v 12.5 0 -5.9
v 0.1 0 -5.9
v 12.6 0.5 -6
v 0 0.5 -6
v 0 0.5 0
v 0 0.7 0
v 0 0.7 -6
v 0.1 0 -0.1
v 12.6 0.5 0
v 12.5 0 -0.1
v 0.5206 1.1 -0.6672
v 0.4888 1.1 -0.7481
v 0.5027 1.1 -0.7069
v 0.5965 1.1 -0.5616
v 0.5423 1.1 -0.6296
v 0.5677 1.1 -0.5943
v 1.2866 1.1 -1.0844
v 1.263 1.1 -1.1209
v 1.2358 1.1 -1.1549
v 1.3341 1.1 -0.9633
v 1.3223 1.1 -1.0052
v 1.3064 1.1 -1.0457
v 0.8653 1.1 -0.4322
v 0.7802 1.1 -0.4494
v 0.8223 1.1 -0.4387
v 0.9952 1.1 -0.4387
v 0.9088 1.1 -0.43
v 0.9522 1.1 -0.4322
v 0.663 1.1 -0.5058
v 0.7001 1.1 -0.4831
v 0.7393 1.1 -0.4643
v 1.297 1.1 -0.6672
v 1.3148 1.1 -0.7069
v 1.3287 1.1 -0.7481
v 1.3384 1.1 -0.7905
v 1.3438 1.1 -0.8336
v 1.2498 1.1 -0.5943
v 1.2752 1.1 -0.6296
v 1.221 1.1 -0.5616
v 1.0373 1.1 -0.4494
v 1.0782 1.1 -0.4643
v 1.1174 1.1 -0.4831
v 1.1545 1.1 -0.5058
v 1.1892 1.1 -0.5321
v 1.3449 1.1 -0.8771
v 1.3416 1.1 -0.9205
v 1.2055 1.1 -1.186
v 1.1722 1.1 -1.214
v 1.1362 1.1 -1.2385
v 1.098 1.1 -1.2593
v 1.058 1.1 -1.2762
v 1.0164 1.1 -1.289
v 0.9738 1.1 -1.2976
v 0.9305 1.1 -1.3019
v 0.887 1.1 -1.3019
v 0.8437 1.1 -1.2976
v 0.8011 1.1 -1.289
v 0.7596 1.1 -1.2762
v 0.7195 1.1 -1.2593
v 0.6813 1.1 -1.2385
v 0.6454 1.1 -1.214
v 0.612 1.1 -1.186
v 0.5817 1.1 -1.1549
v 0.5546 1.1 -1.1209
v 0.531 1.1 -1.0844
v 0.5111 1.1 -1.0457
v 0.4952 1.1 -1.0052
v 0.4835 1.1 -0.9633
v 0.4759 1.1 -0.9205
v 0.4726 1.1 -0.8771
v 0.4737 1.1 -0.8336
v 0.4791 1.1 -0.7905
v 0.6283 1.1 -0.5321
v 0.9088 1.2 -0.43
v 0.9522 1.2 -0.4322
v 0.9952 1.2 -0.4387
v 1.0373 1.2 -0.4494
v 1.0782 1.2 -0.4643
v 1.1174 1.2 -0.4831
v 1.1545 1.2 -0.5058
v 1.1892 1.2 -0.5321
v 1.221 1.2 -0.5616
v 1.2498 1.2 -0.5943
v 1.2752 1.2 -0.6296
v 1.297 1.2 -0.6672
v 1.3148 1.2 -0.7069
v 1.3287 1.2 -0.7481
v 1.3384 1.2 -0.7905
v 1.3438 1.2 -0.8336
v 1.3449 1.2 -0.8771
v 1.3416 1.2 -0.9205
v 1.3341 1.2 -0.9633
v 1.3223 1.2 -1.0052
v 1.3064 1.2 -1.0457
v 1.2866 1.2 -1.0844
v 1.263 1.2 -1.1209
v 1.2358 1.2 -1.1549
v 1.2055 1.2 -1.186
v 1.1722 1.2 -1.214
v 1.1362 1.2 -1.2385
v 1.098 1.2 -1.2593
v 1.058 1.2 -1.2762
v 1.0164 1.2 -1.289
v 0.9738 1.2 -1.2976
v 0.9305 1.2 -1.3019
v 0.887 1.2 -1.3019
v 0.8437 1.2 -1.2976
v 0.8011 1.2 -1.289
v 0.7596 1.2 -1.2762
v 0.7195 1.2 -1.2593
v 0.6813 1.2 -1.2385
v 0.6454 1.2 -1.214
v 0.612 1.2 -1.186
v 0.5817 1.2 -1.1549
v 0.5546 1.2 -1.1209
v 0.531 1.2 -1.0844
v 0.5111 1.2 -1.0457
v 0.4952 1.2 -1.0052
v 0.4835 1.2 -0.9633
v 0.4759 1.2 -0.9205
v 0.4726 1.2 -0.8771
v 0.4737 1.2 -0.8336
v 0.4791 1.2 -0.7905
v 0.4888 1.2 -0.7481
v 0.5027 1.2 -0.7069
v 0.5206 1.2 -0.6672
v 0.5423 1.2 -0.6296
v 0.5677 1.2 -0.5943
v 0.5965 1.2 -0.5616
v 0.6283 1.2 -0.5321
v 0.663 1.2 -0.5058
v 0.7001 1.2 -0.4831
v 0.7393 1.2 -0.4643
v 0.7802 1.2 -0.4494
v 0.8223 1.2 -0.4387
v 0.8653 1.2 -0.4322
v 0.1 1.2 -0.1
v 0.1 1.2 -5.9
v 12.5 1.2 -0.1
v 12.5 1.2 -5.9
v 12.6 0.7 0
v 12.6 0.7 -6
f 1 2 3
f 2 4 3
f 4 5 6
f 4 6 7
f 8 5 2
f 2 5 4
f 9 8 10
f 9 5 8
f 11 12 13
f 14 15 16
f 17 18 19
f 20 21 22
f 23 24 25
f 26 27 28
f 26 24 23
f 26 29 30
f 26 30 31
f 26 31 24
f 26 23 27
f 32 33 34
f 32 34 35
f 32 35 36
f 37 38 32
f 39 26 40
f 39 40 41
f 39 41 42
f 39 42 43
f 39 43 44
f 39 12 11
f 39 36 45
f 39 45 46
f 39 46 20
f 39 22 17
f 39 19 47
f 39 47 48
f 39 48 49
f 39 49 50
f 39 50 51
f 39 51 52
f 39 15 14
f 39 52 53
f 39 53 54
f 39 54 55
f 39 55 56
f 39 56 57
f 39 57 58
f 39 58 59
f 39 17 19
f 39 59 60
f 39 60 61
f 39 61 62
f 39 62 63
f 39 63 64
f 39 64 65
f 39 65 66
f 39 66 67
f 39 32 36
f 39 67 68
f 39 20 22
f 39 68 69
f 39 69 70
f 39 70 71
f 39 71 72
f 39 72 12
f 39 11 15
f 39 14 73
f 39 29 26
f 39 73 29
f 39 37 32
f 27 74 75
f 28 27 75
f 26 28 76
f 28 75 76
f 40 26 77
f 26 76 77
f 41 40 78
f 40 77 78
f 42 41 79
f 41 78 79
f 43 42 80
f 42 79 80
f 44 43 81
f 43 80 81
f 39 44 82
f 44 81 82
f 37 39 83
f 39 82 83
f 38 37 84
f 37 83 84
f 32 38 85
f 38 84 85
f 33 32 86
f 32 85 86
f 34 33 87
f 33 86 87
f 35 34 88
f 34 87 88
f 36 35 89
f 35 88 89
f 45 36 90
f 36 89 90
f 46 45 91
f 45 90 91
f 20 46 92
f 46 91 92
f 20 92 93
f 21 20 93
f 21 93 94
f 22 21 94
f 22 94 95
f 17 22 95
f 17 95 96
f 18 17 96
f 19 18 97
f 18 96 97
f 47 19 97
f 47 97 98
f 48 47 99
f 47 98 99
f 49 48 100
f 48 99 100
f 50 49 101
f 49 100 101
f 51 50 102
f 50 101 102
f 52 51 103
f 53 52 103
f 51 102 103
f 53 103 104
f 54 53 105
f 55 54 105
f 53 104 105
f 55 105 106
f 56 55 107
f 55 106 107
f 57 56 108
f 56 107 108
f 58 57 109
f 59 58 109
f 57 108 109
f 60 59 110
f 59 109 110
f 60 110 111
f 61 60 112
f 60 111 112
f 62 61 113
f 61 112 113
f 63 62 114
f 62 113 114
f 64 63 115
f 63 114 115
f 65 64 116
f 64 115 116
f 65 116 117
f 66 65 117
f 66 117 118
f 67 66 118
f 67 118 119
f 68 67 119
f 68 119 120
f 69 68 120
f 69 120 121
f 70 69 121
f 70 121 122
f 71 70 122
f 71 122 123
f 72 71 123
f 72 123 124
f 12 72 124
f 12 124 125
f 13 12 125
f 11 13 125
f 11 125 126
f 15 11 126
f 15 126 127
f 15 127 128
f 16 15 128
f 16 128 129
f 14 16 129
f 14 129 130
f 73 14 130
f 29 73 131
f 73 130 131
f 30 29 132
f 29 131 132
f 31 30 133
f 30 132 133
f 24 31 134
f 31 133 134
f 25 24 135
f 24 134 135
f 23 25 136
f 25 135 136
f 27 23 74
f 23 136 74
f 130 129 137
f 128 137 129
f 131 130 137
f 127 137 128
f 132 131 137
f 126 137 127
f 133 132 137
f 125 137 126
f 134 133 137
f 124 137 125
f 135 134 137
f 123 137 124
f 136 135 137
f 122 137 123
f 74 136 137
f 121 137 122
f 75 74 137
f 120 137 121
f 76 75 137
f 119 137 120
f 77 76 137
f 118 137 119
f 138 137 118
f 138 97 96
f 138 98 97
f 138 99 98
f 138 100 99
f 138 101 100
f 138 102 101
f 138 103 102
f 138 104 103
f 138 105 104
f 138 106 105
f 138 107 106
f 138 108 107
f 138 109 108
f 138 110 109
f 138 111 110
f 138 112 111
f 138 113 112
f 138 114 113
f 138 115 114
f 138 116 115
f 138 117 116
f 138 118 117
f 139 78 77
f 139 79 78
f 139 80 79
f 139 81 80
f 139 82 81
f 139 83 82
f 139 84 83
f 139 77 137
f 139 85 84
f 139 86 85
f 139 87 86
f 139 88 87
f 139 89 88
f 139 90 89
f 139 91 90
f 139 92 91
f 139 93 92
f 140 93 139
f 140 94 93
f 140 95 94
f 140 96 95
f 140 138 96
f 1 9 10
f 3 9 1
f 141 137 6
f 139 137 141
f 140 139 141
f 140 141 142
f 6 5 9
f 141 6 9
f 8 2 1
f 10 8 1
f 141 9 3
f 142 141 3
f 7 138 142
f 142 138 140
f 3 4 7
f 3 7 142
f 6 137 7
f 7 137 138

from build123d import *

# Parameters (mm, degrees)
ESQUISSE1_W             = 12.6
ESQUISSE1_H             = 6
BOSS_EXTRU_1_DEPTH      = 1.2
CHANFREIN1_SIZE         = 0.5
CHANFREIN1_SIZE2        = 0.1
CHANFREIN2_SIZE         = 0.1
CHANFREIN2_SIZE2        = 0.5
CHANFREIN3_SIZE         = 0.5
CHANFREIN3_SIZE2        = 0.1
CHANFREIN4_SIZE         = 0.1
CHANFREIN4_SIZE2        = 0.5
CHANFREIN5_SIZE         = 0.5
CHANFREIN5_SIZE2        = 0.1
CHANFREIN6_SIZE         = 0.1
CHANFREIN6_SIZE2        = 0.5
CHANFREIN7_SIZE         = 0.5
CHANFREIN7_SIZE2        = 0.1
CHANFREIN8_SIZE         = 0.1
CHANFREIN8_SIZE2        = 0.5
ESQUISSE2_R             = 0.436243036
ENL_V_MAT_EXTRU_1_DEPTH = 0.1


with BuildPart() as part:
    # Esquisse1 → Boss.-Extru.1 (new body)
    with BuildSketch(Plane(origin=(0, 0, 0), x_dir=(1, 0, 0), z_dir=(0, 1, 0))):
        with Locations((6.3, 3)):
            Rectangle(ESQUISSE1_W, ESQUISSE1_H)
    extrude(amount=BOSS_EXTRU_1_DEPTH)

    # Chanfrein1
    chanfrein1_edges = [part.edges().sort_by_distance(p)[0] for p in [
        (6.3, 1.2, 0),
    ]]
    chanfrein1_side = [part.faces().sort_by_distance(p)[0] for p in [
        (6.3, 0.6, 0),
    ]]
    chamfer(chanfrein1_edges, length=CHANFREIN1_SIZE, length2=CHANFREIN1_SIZE2, reference=chanfrein1_side[0])

    # Chanfrein2
    chanfrein2_edges = [part.edges().sort_by_distance(p)[0] for p in [
        (6.3, 0, 0),
    ]]
    chanfrein2_side = [part.faces().sort_by_distance(p)[0] for p in [
        (6.3, 0, -3),
    ]]
    chamfer(chanfrein2_edges, length=CHANFREIN2_SIZE, length2=CHANFREIN2_SIZE2, reference=chanfrein2_side[0])

    # Chanfrein3
    chanfrein3_edges = [part.edges().sort_by_distance(p)[0] for p in [
        (6.3, 1.2, -6),
    ]]
    chanfrein3_side = [part.faces().sort_by_distance(p)[0] for p in [
        (6.3, 0.6, -6),
    ]]
    chamfer(chanfrein3_edges, length=CHANFREIN3_SIZE, length2=CHANFREIN3_SIZE2, reference=chanfrein3_side[0])

    # Chanfrein4
    chanfrein4_edges = [part.edges().sort_by_distance(p)[0] for p in [
        (6.3, 0, -6),
    ]]
    chanfrein4_side = [part.faces().sort_by_distance(p)[0] for p in [
        (6.3, 0, -3.05),
    ]]
    chamfer(chanfrein4_edges, length=CHANFREIN4_SIZE, length2=CHANFREIN4_SIZE2, reference=chanfrein4_side[0])

    # Chanfrein5
    chanfrein5_edges = [part.edges().sort_by_distance(p)[0] for p in [
        (0, 1.2, -3),
    ]]
    chanfrein5_side = [part.faces().sort_by_distance(p)[0] for p in [
        (0, 0.6, -3),
    ]]
    chamfer(chanfrein5_edges, length=CHANFREIN5_SIZE, length2=CHANFREIN5_SIZE2, reference=chanfrein5_side[0])

    # Chanfrein6
    chanfrein6_edges = [part.edges().sort_by_distance(p)[0] for p in [
        (0, 0, -3),
    ]]
    chanfrein6_side = [part.faces().sort_by_distance(p)[0] for p in [
        (6.3, 0, -3),
    ]]
    chamfer(chanfrein6_edges, length=CHANFREIN6_SIZE, length2=CHANFREIN6_SIZE2, reference=chanfrein6_side[0])

    # Chanfrein7
    chanfrein7_edges = [part.edges().sort_by_distance(p)[0] for p in [
        (12.6, 1.2, -3),
    ]]
    chanfrein7_side = [part.faces().sort_by_distance(p)[0] for p in [
        (12.6, 0.6, -3),
    ]]
    chamfer(chanfrein7_edges, length=CHANFREIN7_SIZE, length2=CHANFREIN7_SIZE2, reference=chanfrein7_side[0])

    # Chanfrein8
    chanfrein8_edges = [part.edges().sort_by_distance(p)[0] for p in [
        (12.6, 0, -3),
    ]]
    chanfrein8_side = [part.faces().sort_by_distance(p)[0] for p in [
        (6.35, 0, -3),
    ]]
    chamfer(chanfrein8_edges, length=CHANFREIN8_SIZE, length2=CHANFREIN8_SIZE2, reference=chanfrein8_side[0])

    # Esquisse2 → Enlèv. mat.-Extru.1 (cut)
    with BuildSketch(Plane(origin=(0, 1.2, 0), x_dir=(-1, 0, 0), z_dir=(0, 1, 0))):
        with Locations(Location((-0.908756143, -0.866244747, 0), (0, 0, 90))):  # turned: the seam where the file's is
            Circle(ESQUISSE2_R)
    extrude(amount=-ENL_V_MAT_EXTRU_1_DEPTH, mode=Mode.SUBTRACT)


solid = part.part
